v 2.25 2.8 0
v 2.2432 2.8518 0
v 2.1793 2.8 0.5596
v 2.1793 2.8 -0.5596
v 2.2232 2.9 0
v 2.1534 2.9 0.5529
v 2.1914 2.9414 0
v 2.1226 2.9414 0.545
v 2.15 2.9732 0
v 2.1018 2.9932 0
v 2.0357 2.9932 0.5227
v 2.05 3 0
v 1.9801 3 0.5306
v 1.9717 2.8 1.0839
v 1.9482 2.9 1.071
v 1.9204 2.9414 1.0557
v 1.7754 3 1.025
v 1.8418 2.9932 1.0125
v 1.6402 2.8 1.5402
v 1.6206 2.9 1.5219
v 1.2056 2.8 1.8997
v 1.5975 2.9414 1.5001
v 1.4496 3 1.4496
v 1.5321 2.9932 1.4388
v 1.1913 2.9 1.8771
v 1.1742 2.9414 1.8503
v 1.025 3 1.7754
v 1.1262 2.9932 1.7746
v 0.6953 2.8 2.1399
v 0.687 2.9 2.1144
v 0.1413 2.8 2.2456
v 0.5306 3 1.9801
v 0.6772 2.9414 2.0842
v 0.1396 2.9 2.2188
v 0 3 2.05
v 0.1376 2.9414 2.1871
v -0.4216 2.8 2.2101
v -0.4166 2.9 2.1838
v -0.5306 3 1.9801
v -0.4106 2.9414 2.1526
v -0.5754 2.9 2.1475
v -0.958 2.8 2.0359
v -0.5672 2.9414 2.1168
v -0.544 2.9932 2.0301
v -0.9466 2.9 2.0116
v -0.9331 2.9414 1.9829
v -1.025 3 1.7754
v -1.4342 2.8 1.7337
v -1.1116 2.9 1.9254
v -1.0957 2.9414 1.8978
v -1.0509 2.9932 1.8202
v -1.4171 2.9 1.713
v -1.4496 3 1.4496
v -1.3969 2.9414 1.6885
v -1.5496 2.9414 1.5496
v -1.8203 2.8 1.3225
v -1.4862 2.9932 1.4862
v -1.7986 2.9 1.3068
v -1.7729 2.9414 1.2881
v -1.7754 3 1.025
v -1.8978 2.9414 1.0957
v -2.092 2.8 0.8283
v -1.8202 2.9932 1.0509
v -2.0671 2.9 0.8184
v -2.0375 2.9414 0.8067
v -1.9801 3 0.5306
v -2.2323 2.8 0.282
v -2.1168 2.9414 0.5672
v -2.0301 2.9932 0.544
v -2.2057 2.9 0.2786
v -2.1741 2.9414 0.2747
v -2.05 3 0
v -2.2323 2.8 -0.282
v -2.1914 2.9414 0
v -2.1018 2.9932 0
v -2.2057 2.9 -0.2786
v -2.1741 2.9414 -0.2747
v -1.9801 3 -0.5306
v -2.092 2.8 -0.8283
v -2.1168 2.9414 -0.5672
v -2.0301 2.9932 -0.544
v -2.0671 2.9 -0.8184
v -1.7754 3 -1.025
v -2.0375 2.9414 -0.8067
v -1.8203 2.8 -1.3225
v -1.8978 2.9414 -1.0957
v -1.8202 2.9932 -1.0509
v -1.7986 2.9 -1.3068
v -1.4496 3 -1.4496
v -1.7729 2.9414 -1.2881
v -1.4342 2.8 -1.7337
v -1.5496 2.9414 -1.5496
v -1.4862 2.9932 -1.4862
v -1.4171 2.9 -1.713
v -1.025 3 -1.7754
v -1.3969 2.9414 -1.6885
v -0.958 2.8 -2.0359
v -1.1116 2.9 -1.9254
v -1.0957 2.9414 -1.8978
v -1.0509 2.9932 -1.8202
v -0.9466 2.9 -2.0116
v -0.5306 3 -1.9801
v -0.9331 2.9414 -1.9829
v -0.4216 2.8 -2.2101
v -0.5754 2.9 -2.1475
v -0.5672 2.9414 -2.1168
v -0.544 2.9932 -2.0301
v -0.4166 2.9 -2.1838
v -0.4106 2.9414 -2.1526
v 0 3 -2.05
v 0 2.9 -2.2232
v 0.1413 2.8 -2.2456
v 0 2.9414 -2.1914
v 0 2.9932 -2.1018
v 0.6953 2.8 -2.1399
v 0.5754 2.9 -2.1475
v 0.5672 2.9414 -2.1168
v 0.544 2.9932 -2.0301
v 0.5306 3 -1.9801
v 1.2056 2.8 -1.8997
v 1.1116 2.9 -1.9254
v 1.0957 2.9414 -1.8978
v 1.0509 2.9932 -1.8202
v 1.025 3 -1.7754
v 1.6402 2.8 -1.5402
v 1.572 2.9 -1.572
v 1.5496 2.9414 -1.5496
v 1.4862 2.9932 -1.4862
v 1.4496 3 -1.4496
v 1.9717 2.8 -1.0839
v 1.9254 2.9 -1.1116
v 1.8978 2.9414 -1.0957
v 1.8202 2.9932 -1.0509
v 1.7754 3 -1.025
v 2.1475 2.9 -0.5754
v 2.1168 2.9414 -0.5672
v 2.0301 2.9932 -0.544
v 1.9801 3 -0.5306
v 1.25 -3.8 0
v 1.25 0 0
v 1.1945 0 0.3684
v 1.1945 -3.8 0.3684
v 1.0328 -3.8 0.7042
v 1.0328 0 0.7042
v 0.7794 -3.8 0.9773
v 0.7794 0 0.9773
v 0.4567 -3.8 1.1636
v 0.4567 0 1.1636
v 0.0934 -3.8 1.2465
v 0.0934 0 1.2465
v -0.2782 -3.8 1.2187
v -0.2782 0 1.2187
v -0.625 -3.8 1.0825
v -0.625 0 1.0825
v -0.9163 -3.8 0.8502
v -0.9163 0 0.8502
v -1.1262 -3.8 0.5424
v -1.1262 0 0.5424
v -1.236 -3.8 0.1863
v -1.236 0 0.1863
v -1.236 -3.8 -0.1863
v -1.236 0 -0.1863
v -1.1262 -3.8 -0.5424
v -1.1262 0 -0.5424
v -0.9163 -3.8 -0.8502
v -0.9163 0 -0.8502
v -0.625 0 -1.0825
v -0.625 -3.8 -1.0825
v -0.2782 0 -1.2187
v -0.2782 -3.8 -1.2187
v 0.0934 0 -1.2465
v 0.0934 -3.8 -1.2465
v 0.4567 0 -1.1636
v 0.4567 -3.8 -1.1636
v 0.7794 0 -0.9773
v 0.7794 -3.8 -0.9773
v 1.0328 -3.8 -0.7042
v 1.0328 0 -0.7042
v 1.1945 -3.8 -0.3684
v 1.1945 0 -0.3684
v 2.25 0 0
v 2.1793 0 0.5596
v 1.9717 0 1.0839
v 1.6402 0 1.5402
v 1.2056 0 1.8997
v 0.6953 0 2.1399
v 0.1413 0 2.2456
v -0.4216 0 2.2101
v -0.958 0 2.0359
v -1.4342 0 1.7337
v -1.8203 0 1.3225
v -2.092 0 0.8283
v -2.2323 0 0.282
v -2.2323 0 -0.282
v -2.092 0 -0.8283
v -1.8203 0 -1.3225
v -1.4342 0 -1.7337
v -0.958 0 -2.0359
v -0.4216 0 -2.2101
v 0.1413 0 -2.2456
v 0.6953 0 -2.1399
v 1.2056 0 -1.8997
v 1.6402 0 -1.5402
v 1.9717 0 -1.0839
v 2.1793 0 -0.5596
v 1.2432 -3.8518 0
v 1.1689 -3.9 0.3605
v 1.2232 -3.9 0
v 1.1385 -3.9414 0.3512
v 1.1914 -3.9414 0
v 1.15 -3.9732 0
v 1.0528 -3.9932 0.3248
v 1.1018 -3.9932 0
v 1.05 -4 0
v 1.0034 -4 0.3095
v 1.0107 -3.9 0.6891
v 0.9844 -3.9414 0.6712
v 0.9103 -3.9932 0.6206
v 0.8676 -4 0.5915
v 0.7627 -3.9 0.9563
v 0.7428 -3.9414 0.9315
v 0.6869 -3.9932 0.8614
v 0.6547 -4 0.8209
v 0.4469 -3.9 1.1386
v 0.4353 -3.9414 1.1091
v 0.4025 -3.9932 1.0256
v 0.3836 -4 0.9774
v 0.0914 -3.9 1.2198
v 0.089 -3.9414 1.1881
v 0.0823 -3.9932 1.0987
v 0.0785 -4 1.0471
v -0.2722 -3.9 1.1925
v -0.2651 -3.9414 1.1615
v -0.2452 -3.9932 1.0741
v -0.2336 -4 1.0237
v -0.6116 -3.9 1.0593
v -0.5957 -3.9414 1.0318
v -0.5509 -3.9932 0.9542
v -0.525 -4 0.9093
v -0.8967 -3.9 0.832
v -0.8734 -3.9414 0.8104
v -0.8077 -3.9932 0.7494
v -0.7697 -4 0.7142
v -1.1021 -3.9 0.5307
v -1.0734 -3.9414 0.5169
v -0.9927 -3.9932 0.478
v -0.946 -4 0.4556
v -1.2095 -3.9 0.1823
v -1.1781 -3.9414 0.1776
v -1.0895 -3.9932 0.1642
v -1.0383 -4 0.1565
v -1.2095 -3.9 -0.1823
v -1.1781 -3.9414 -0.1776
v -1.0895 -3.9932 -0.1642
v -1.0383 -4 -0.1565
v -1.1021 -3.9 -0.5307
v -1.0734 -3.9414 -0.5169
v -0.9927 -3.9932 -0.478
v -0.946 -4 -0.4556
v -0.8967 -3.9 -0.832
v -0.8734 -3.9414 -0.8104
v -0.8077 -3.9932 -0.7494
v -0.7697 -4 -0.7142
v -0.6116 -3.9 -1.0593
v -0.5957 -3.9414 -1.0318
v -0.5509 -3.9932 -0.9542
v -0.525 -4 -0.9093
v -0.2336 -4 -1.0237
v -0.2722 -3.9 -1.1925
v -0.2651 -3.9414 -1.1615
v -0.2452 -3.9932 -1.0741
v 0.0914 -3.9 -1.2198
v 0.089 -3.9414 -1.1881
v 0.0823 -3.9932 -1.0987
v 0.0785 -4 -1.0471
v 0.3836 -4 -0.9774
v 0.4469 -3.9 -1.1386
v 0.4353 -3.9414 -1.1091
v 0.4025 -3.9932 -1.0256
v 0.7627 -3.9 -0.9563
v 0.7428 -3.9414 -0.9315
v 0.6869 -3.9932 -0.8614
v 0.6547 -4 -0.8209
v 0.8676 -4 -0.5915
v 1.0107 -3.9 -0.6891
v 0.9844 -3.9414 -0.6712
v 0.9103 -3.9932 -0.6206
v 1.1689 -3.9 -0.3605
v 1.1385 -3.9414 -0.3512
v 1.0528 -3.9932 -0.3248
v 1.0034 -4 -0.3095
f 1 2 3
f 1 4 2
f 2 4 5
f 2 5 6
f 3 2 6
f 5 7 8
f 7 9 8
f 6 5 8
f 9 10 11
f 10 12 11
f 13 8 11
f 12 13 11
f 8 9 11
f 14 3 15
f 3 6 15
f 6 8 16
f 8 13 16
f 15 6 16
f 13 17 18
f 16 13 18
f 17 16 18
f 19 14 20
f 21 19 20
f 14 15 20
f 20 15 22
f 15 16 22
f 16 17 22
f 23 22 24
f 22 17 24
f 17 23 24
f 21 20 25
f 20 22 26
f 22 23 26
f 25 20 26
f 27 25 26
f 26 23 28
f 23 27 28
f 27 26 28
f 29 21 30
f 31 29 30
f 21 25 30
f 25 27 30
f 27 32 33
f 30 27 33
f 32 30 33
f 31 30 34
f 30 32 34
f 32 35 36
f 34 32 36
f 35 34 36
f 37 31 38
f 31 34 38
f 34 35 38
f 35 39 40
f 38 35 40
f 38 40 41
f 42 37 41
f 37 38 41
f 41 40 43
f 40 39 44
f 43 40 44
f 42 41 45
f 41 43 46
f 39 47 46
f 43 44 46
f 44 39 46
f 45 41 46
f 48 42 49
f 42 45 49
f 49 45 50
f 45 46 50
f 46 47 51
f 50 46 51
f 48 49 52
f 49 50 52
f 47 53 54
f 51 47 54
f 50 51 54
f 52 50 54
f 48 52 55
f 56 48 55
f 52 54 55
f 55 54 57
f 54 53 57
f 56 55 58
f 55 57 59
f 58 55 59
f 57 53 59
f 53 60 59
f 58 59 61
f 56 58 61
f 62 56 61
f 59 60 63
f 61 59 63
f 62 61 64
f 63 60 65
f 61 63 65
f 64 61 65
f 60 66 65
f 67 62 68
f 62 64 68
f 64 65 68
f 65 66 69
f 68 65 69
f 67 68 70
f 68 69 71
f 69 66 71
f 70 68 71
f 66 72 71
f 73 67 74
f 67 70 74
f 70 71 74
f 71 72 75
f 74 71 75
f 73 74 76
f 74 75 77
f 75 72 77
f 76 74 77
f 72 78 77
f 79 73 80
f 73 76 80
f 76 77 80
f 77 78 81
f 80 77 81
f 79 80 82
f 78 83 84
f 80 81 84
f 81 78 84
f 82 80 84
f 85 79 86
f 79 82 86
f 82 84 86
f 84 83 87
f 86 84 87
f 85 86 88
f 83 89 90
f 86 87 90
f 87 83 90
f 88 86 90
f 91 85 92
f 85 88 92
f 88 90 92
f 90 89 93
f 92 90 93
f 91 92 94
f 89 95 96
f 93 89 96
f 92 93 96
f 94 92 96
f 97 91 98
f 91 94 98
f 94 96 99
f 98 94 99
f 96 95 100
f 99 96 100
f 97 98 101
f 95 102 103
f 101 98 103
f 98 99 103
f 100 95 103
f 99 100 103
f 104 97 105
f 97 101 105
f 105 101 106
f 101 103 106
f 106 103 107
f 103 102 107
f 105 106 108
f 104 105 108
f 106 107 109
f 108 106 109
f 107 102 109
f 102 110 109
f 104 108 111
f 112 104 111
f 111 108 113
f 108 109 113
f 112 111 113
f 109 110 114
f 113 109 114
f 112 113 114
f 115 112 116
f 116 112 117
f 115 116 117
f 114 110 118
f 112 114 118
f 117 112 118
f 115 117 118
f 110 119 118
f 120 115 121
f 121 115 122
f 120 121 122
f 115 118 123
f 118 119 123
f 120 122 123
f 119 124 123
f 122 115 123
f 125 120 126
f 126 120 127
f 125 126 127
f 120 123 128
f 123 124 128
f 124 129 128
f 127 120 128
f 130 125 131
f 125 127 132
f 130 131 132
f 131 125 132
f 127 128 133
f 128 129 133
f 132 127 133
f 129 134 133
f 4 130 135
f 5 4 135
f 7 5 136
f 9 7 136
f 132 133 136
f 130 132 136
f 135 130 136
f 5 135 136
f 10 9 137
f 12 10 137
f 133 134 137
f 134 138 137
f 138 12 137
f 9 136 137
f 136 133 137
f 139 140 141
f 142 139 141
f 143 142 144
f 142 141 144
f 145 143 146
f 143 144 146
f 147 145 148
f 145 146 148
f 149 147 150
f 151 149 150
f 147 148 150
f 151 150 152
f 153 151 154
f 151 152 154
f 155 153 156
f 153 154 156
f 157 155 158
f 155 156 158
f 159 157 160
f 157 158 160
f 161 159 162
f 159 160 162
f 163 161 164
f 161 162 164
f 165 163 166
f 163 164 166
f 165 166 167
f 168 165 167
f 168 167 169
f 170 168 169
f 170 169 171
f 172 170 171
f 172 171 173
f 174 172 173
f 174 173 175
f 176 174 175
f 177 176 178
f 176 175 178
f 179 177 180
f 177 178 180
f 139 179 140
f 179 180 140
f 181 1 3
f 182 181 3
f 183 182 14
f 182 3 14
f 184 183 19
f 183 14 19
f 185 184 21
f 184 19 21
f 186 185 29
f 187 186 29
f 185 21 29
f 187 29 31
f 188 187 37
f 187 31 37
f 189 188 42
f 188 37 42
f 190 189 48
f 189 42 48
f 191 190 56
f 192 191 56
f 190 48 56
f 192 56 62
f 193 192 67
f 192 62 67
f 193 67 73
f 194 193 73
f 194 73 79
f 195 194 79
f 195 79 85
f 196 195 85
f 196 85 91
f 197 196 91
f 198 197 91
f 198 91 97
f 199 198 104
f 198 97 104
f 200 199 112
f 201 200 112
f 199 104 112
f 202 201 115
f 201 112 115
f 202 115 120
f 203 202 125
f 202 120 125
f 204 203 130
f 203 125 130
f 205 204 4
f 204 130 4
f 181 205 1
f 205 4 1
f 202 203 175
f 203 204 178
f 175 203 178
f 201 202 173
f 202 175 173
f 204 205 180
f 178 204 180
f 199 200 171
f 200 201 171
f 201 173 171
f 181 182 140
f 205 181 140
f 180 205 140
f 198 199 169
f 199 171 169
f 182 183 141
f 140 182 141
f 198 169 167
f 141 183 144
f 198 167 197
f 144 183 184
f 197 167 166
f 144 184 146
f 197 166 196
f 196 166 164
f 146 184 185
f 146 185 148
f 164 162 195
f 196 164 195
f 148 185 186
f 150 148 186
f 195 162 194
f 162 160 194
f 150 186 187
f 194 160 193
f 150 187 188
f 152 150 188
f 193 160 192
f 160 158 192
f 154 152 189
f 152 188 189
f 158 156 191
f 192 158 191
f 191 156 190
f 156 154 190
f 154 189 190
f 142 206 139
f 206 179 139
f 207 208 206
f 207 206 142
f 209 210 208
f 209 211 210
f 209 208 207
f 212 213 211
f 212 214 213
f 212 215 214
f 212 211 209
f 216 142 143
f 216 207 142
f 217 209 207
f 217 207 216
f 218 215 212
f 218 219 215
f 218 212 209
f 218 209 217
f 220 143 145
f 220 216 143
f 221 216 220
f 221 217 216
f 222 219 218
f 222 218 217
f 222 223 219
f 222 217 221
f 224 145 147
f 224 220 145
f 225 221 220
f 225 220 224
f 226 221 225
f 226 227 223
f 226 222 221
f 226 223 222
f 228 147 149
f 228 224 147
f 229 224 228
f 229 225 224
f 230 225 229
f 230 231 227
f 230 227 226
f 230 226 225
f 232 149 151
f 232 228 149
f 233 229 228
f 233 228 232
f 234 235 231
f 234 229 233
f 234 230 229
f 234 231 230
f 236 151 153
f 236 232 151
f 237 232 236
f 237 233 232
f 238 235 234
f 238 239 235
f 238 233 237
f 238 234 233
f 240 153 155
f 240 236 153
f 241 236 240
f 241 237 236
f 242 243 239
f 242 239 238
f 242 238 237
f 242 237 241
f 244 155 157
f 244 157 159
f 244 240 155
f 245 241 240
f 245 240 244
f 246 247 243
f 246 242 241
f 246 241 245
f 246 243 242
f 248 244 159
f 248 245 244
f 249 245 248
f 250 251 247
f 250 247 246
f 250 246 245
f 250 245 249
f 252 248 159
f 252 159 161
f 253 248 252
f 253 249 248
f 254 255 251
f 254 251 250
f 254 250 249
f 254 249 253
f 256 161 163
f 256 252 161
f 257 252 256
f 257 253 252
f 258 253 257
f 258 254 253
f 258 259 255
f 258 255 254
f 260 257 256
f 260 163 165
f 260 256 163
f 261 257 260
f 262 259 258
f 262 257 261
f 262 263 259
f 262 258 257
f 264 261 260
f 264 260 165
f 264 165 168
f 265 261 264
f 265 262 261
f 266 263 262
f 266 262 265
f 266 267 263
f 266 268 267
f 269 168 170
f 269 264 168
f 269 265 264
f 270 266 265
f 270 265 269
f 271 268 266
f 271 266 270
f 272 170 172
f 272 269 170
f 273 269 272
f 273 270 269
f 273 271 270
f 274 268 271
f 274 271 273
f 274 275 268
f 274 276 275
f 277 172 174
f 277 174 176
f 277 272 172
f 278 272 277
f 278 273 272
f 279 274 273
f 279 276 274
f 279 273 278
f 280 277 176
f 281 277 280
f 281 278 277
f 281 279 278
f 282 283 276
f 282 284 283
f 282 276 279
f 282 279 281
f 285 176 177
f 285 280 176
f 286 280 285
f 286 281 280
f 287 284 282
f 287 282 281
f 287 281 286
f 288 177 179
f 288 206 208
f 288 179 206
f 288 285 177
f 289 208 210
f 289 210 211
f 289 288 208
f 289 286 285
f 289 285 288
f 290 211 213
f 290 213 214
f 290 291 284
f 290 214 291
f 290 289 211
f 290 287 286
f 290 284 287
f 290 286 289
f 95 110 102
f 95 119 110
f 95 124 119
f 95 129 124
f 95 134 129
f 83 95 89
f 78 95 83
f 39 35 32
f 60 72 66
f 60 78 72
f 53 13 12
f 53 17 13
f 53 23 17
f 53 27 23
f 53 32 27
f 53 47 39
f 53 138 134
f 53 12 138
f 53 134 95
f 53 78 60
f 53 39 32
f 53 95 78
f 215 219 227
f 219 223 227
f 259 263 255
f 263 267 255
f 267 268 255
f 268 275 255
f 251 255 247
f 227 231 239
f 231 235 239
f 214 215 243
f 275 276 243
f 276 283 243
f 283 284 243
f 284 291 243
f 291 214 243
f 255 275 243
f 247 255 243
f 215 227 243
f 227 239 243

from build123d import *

# Parameters (mm, degrees)
SKETCH1_W   = 2.25
SKETCH1_H   = 3
SKETCH1_W_2 = 1.25
SKETCH1_H_2 = 4
FILLET1_R   = 0.2
FILLET2_R   = 0.2


with BuildPart() as part:
    # Sketch1 → Revolve1 (revolve)
    with BuildSketch(Plane.XY):
        with Locations((1.125, 1.5)):
            Rectangle(SKETCH1_W, SKETCH1_H)
        with Locations((0.625, -2)):
            Rectangle(SKETCH1_W_2, SKETCH1_H_2)
    revolve(axis=Axis((0, 0, 0), (0, -1, 0)))

    # Fillet1
    fillet1_edges = [part.edges().sort_by_distance(p)[0] for p in [
        (-2.25, 3, 0),
    ]]
    fillet(fillet1_edges, radius=FILLET1_R)

    # Fillet2
    fillet2_edges = [part.edges().sort_by_distance(p)[0] for p in [
        (-1.25, -4, 0),
    ]]
    fillet(fillet2_edges, radius=FILLET2_R)


solid = part.part
